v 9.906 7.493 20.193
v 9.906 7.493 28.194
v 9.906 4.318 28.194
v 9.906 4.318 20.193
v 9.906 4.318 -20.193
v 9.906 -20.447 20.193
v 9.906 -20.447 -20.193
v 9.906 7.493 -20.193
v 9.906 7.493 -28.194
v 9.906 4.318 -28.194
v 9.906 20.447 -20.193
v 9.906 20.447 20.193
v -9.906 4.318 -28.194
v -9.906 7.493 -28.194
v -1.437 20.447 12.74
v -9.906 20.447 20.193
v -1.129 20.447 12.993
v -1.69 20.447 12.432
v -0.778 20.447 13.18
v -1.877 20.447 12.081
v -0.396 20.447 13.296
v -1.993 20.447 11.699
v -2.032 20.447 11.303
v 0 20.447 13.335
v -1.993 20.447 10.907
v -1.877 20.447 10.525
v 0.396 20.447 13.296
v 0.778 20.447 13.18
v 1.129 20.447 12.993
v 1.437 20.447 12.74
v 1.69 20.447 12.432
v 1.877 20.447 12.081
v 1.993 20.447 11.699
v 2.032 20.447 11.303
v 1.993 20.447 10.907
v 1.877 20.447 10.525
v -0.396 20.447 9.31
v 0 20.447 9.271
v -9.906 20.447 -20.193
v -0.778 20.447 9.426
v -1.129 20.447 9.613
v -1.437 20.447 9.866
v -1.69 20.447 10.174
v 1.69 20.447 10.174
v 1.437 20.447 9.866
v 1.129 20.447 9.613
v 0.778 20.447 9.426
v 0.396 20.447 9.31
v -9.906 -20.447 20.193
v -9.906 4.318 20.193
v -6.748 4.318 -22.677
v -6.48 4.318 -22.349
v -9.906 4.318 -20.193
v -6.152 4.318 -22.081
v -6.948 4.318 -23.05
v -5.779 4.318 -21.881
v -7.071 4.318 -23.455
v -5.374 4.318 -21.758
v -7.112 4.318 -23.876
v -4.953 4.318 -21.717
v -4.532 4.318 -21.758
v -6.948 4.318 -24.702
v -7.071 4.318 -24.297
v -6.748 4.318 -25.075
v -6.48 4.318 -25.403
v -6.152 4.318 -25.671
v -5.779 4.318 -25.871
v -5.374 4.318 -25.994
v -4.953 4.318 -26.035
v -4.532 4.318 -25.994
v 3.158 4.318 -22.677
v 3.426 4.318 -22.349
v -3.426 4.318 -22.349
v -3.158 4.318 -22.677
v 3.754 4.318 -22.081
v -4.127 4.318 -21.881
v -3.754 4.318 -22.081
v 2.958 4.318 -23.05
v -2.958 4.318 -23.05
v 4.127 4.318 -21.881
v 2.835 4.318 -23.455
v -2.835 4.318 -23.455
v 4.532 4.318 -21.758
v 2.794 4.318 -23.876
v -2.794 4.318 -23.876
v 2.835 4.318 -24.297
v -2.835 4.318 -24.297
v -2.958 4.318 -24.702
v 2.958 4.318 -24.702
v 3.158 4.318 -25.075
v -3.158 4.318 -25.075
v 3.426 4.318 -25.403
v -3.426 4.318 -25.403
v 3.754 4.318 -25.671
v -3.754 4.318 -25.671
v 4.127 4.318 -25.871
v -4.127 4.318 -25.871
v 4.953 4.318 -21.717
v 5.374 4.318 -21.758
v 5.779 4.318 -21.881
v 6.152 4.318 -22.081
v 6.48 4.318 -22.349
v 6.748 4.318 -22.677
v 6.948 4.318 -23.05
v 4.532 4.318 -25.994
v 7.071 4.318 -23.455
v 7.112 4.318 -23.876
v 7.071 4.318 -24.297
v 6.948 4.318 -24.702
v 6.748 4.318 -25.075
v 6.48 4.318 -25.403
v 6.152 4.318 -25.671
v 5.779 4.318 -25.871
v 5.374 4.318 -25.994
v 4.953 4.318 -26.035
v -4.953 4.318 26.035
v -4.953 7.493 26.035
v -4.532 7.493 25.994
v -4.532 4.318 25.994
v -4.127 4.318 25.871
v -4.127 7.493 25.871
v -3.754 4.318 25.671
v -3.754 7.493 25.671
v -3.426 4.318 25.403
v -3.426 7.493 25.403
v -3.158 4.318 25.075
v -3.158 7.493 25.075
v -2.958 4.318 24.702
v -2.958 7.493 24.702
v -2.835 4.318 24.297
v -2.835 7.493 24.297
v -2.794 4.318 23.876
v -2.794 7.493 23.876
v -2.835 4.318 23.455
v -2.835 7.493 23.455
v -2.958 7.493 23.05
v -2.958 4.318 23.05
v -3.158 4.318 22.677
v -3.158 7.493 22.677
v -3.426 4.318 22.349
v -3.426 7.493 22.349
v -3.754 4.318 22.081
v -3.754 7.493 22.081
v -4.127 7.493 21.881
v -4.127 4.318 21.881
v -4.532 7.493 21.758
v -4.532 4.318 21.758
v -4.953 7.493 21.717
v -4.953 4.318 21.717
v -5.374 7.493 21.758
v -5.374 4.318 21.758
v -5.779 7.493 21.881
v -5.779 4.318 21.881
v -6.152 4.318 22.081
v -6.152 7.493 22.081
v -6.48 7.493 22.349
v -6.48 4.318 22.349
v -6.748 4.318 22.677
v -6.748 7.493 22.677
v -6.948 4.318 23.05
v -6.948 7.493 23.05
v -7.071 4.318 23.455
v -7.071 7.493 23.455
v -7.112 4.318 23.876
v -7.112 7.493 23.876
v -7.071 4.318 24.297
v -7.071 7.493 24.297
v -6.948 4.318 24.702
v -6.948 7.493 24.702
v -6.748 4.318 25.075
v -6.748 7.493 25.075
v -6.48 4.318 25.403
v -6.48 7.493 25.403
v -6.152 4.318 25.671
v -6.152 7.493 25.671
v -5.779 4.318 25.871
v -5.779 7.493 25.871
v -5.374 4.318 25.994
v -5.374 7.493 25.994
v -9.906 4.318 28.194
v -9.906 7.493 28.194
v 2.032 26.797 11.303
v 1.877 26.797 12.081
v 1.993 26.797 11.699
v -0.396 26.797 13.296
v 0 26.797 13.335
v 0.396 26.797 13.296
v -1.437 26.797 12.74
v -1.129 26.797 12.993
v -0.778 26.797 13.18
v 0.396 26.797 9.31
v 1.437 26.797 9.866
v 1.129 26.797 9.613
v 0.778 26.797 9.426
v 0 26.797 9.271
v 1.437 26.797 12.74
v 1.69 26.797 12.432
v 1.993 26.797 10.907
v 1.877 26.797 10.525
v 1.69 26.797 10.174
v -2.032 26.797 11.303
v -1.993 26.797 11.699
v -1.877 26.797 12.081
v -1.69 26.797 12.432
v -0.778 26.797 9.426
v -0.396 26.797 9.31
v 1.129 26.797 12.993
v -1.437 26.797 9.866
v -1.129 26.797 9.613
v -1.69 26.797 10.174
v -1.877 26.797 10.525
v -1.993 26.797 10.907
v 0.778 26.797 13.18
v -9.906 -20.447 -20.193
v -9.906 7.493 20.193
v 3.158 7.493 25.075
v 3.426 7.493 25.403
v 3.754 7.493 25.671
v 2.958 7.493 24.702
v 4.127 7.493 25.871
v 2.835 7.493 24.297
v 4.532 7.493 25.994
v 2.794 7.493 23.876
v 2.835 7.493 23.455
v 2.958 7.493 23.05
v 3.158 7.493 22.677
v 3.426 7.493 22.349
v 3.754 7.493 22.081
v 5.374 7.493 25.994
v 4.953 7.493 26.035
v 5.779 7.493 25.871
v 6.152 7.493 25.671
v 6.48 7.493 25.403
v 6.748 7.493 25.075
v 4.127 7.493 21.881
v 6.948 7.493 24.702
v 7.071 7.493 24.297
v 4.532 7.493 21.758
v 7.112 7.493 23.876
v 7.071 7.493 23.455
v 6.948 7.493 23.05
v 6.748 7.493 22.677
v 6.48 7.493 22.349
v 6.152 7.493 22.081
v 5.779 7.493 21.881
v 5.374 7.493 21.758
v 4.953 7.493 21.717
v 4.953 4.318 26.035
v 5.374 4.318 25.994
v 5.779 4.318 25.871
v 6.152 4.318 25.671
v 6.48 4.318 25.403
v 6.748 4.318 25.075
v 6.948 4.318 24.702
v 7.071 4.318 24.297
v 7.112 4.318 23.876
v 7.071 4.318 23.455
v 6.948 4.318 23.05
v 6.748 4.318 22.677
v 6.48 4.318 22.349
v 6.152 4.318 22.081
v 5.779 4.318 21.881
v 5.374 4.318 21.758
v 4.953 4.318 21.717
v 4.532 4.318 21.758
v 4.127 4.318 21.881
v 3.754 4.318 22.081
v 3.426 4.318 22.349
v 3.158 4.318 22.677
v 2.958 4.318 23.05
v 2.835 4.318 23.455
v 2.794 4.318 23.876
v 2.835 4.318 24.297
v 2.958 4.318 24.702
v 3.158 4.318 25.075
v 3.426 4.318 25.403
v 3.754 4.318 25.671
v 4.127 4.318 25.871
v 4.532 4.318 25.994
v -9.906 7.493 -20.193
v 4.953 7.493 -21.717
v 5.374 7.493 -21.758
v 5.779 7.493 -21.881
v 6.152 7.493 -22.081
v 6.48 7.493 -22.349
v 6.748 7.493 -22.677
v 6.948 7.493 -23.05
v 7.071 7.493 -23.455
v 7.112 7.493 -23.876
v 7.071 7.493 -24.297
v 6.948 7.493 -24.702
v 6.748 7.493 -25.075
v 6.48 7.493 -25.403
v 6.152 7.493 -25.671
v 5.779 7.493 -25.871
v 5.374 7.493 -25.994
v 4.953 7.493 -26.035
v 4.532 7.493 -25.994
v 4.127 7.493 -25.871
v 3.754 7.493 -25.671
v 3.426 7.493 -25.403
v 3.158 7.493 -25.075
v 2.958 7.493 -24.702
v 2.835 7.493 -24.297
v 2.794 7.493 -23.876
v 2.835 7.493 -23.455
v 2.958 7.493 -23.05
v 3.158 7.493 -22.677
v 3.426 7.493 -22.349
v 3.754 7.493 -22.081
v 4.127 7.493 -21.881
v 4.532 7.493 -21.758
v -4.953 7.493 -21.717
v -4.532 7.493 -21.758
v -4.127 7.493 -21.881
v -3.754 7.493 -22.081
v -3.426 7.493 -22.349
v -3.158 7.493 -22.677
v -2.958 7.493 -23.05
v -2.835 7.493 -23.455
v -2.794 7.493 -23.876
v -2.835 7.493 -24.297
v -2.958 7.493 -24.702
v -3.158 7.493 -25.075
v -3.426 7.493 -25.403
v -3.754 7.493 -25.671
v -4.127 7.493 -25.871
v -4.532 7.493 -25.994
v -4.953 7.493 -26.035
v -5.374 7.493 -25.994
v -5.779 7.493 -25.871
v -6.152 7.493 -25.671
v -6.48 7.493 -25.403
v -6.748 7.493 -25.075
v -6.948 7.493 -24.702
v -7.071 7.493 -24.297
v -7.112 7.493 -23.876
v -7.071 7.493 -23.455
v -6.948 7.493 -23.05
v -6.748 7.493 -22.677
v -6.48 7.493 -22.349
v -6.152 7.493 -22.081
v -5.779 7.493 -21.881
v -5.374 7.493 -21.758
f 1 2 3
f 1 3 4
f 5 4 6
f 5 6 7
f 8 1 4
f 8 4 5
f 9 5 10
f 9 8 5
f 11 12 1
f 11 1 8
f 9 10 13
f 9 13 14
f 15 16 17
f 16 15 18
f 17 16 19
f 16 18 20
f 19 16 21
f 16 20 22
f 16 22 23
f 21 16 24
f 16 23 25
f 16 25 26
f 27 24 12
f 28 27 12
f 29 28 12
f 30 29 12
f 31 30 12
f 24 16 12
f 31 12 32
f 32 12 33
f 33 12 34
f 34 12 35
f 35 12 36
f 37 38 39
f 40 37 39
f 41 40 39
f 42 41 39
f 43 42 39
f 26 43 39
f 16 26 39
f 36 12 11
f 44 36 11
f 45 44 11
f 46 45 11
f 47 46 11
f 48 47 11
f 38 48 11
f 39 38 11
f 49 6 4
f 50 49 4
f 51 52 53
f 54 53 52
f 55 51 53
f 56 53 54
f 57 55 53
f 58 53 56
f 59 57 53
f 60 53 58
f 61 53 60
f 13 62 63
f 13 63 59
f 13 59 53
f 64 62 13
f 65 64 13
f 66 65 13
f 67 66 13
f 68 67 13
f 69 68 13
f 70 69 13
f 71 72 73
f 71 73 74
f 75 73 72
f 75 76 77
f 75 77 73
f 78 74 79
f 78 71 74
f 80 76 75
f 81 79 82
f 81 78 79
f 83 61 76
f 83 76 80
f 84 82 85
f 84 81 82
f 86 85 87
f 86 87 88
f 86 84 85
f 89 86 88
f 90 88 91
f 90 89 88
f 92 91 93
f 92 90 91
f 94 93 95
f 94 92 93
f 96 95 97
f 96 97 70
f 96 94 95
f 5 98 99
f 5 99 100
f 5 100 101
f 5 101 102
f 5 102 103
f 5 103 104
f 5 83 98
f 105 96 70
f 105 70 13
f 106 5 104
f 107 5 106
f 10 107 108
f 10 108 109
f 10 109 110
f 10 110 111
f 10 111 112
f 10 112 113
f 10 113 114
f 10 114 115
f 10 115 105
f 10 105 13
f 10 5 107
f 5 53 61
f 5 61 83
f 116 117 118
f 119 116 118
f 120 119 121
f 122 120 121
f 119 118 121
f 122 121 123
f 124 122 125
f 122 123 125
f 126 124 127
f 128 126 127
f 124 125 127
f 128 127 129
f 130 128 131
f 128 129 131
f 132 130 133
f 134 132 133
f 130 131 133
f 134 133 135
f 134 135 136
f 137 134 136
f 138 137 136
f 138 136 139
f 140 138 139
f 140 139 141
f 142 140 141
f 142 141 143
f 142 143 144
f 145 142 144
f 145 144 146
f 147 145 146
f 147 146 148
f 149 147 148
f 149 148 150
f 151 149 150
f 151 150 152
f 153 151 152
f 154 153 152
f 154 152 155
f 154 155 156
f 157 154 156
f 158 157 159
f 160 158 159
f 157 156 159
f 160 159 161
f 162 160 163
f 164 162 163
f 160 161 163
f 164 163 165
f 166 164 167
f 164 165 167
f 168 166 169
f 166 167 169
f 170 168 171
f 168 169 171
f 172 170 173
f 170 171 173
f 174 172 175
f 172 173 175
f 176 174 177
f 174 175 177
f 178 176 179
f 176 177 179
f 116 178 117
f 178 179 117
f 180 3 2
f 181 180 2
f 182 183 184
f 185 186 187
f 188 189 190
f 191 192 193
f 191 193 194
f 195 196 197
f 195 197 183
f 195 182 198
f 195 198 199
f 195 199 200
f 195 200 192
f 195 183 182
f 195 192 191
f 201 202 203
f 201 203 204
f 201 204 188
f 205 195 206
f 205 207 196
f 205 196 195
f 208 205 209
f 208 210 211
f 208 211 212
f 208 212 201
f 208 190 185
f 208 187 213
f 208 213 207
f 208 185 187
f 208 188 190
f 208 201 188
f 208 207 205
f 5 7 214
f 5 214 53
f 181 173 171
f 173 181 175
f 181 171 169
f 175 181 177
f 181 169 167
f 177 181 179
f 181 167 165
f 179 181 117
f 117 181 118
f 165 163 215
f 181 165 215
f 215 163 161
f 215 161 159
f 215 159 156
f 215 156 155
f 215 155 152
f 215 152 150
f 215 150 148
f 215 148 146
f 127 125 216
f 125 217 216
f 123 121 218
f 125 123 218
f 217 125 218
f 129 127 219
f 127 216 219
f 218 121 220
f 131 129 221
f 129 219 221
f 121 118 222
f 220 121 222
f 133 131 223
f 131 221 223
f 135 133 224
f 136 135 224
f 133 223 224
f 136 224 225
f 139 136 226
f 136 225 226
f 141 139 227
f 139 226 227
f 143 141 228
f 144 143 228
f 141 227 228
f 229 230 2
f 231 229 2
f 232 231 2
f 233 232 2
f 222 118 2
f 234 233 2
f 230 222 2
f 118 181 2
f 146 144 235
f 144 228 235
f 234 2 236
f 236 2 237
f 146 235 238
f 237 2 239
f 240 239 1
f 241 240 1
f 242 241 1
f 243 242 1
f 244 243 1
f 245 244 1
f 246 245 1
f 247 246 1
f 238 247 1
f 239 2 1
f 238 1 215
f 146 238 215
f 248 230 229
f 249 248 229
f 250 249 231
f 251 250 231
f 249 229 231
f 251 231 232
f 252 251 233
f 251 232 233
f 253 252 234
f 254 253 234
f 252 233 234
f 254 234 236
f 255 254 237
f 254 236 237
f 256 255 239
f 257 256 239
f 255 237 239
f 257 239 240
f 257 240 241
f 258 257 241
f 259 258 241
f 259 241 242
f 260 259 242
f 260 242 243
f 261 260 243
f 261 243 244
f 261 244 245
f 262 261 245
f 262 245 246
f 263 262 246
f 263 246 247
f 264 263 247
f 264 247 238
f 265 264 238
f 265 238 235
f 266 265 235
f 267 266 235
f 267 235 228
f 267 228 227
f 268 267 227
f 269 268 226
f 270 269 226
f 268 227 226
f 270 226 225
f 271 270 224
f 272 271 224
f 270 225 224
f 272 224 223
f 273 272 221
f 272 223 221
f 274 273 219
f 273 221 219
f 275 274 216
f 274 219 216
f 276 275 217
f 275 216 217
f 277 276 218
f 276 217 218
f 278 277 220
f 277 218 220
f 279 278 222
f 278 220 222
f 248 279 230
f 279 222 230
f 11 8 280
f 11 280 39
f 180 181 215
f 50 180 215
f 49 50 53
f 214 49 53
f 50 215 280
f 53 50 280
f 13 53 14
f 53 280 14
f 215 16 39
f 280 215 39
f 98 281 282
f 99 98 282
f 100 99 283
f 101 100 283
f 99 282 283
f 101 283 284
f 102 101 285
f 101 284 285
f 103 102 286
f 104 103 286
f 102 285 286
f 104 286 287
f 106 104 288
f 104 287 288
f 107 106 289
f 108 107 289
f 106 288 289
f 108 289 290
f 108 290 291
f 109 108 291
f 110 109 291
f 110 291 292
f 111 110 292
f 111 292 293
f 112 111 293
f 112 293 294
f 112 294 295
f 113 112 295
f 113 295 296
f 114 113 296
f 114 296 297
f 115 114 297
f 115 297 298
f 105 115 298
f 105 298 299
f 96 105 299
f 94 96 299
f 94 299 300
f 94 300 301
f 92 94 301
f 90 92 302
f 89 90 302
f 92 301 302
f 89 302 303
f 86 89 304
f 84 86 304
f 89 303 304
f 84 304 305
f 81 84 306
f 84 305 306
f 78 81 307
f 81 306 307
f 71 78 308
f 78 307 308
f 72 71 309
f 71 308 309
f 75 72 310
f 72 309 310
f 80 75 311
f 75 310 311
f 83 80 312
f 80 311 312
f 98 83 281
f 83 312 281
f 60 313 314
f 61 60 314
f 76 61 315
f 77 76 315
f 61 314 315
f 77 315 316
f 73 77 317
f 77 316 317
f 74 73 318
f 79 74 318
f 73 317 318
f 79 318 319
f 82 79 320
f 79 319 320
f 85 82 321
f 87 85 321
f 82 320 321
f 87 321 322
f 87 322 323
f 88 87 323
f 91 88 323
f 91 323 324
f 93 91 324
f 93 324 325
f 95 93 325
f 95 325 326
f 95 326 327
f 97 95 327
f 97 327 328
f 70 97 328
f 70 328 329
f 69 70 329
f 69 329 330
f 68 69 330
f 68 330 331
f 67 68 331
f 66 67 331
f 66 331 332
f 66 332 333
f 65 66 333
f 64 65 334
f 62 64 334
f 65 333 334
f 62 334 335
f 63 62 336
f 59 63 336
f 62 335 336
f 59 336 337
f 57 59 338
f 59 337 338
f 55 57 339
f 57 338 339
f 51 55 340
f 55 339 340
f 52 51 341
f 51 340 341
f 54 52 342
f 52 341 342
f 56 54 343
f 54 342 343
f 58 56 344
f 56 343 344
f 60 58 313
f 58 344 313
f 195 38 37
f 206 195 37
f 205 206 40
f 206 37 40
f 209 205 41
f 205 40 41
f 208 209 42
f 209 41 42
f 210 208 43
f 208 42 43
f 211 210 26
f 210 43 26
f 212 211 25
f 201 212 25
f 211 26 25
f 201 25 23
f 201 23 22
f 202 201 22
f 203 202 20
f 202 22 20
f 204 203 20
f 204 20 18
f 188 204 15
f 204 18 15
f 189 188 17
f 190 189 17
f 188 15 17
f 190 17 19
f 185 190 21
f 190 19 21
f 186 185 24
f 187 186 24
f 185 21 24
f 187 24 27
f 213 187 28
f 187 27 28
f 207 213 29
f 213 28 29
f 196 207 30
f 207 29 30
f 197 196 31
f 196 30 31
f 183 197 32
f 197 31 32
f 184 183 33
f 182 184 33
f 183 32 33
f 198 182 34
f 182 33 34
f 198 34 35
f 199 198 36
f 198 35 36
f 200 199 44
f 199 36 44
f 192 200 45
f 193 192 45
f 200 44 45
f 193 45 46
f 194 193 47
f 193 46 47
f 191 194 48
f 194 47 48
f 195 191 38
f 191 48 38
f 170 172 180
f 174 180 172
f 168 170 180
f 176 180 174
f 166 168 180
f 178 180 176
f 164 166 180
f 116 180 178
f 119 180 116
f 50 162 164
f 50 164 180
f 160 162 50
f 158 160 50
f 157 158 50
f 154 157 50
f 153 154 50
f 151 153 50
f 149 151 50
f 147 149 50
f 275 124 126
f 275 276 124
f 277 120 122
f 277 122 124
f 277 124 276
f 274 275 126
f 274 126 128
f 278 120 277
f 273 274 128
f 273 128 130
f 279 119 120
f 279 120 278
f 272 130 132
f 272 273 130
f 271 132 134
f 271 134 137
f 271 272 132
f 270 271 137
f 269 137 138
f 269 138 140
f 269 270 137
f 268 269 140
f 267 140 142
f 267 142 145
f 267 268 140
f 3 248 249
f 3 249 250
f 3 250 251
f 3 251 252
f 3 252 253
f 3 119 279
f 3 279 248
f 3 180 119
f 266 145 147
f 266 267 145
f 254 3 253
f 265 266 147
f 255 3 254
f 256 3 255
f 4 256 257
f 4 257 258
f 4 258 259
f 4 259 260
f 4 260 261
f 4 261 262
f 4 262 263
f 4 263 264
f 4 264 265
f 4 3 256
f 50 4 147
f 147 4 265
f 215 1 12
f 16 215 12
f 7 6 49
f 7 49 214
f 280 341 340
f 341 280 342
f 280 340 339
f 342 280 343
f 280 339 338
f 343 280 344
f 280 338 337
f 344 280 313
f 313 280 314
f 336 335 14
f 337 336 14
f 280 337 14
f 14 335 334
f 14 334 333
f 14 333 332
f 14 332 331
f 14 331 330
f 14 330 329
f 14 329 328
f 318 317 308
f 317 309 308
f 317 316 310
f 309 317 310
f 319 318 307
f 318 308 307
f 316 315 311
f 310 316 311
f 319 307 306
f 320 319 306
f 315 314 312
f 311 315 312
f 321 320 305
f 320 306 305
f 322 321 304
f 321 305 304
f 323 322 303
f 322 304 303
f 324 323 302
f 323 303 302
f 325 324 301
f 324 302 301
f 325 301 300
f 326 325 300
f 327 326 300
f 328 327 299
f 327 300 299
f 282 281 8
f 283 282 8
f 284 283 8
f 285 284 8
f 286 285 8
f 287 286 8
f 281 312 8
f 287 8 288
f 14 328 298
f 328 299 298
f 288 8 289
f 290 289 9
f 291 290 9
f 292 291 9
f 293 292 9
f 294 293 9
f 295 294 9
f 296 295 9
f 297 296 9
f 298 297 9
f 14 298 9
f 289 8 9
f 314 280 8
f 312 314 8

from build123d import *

# Parameters (mm, degrees)
SKETCH1_W           = 40.386
SKETCH1_H           = 40.894
BOSS_EXTRUDE1_DEPTH = 9.906
SKETCH2_W           = 56.388
SKETCH2_H           = 3.175
BOSS_EXTRUDE2_DEPTH = 19.812
SKETCH3_R           = 2.159
CUT_EXTRUDE1_DEPTH  = 19.812
SKETCH4_R           = 2.032
BOSS_EXTRUDE3_DEPTH = 6.35


with BuildPart() as part:
    # Sketch1 → Boss-Extrude1 (new, symmetric)
    with BuildSketch(Plane(origin=(0, 0, 0), x_dir=(0, 0, -1), z_dir=(1, 0, 0))):
        Rectangle(SKETCH1_W, SKETCH1_H)
    extrude(amount=BOSS_EXTRUDE1_DEPTH, both=True)

    # Sketch2 → Boss-Extrude2 (add, through all)
    with BuildSketch(Plane(origin=(9.906, 0, 0), x_dir=(0, 0, -1), z_dir=(1, 0, 0))):
        with Locations((0, 5.9055)):
            Rectangle(SKETCH2_W, SKETCH2_H)
    extrude(amount=-BOSS_EXTRUDE2_DEPTH)

    # Sketch3 → Cut-Extrude1 (cut)
    with BuildSketch(Plane(origin=(0, 7.493, 0), x_dir=(1, 0, 0), z_dir=(0, 1, 0))):
        with Locations(Location((-4.953, 23.876, 0), (0, 0, 270))):
            Circle(SKETCH3_R)
        with Locations(Location((4.953, 23.876, 0), (0, 0, 270))):
            Circle(SKETCH3_R)
        with Locations(Location((4.953, -23.876, 0), (0, 0, 270))):
            Circle(SKETCH3_R)
        with Locations(Location((-4.953, -23.876, 0), (0, 0, 270))):
            Circle(SKETCH3_R)
    extrude(amount=-CUT_EXTRUDE1_DEPTH, mode=Mode.SUBTRACT)

    # Sketch4 → Boss-Extrude3 (add)
    with BuildSketch(Plane(origin=(0, 20.447, 0), x_dir=(1, 0, 0), z_dir=(0, 1, 0))):
        with Locations(Location((0, -11.303, 0), (0, 0, 90))):
            Circle(SKETCH4_R)
    extrude(amount=BOSS_EXTRUDE3_DEPTH)


solid = part.part
